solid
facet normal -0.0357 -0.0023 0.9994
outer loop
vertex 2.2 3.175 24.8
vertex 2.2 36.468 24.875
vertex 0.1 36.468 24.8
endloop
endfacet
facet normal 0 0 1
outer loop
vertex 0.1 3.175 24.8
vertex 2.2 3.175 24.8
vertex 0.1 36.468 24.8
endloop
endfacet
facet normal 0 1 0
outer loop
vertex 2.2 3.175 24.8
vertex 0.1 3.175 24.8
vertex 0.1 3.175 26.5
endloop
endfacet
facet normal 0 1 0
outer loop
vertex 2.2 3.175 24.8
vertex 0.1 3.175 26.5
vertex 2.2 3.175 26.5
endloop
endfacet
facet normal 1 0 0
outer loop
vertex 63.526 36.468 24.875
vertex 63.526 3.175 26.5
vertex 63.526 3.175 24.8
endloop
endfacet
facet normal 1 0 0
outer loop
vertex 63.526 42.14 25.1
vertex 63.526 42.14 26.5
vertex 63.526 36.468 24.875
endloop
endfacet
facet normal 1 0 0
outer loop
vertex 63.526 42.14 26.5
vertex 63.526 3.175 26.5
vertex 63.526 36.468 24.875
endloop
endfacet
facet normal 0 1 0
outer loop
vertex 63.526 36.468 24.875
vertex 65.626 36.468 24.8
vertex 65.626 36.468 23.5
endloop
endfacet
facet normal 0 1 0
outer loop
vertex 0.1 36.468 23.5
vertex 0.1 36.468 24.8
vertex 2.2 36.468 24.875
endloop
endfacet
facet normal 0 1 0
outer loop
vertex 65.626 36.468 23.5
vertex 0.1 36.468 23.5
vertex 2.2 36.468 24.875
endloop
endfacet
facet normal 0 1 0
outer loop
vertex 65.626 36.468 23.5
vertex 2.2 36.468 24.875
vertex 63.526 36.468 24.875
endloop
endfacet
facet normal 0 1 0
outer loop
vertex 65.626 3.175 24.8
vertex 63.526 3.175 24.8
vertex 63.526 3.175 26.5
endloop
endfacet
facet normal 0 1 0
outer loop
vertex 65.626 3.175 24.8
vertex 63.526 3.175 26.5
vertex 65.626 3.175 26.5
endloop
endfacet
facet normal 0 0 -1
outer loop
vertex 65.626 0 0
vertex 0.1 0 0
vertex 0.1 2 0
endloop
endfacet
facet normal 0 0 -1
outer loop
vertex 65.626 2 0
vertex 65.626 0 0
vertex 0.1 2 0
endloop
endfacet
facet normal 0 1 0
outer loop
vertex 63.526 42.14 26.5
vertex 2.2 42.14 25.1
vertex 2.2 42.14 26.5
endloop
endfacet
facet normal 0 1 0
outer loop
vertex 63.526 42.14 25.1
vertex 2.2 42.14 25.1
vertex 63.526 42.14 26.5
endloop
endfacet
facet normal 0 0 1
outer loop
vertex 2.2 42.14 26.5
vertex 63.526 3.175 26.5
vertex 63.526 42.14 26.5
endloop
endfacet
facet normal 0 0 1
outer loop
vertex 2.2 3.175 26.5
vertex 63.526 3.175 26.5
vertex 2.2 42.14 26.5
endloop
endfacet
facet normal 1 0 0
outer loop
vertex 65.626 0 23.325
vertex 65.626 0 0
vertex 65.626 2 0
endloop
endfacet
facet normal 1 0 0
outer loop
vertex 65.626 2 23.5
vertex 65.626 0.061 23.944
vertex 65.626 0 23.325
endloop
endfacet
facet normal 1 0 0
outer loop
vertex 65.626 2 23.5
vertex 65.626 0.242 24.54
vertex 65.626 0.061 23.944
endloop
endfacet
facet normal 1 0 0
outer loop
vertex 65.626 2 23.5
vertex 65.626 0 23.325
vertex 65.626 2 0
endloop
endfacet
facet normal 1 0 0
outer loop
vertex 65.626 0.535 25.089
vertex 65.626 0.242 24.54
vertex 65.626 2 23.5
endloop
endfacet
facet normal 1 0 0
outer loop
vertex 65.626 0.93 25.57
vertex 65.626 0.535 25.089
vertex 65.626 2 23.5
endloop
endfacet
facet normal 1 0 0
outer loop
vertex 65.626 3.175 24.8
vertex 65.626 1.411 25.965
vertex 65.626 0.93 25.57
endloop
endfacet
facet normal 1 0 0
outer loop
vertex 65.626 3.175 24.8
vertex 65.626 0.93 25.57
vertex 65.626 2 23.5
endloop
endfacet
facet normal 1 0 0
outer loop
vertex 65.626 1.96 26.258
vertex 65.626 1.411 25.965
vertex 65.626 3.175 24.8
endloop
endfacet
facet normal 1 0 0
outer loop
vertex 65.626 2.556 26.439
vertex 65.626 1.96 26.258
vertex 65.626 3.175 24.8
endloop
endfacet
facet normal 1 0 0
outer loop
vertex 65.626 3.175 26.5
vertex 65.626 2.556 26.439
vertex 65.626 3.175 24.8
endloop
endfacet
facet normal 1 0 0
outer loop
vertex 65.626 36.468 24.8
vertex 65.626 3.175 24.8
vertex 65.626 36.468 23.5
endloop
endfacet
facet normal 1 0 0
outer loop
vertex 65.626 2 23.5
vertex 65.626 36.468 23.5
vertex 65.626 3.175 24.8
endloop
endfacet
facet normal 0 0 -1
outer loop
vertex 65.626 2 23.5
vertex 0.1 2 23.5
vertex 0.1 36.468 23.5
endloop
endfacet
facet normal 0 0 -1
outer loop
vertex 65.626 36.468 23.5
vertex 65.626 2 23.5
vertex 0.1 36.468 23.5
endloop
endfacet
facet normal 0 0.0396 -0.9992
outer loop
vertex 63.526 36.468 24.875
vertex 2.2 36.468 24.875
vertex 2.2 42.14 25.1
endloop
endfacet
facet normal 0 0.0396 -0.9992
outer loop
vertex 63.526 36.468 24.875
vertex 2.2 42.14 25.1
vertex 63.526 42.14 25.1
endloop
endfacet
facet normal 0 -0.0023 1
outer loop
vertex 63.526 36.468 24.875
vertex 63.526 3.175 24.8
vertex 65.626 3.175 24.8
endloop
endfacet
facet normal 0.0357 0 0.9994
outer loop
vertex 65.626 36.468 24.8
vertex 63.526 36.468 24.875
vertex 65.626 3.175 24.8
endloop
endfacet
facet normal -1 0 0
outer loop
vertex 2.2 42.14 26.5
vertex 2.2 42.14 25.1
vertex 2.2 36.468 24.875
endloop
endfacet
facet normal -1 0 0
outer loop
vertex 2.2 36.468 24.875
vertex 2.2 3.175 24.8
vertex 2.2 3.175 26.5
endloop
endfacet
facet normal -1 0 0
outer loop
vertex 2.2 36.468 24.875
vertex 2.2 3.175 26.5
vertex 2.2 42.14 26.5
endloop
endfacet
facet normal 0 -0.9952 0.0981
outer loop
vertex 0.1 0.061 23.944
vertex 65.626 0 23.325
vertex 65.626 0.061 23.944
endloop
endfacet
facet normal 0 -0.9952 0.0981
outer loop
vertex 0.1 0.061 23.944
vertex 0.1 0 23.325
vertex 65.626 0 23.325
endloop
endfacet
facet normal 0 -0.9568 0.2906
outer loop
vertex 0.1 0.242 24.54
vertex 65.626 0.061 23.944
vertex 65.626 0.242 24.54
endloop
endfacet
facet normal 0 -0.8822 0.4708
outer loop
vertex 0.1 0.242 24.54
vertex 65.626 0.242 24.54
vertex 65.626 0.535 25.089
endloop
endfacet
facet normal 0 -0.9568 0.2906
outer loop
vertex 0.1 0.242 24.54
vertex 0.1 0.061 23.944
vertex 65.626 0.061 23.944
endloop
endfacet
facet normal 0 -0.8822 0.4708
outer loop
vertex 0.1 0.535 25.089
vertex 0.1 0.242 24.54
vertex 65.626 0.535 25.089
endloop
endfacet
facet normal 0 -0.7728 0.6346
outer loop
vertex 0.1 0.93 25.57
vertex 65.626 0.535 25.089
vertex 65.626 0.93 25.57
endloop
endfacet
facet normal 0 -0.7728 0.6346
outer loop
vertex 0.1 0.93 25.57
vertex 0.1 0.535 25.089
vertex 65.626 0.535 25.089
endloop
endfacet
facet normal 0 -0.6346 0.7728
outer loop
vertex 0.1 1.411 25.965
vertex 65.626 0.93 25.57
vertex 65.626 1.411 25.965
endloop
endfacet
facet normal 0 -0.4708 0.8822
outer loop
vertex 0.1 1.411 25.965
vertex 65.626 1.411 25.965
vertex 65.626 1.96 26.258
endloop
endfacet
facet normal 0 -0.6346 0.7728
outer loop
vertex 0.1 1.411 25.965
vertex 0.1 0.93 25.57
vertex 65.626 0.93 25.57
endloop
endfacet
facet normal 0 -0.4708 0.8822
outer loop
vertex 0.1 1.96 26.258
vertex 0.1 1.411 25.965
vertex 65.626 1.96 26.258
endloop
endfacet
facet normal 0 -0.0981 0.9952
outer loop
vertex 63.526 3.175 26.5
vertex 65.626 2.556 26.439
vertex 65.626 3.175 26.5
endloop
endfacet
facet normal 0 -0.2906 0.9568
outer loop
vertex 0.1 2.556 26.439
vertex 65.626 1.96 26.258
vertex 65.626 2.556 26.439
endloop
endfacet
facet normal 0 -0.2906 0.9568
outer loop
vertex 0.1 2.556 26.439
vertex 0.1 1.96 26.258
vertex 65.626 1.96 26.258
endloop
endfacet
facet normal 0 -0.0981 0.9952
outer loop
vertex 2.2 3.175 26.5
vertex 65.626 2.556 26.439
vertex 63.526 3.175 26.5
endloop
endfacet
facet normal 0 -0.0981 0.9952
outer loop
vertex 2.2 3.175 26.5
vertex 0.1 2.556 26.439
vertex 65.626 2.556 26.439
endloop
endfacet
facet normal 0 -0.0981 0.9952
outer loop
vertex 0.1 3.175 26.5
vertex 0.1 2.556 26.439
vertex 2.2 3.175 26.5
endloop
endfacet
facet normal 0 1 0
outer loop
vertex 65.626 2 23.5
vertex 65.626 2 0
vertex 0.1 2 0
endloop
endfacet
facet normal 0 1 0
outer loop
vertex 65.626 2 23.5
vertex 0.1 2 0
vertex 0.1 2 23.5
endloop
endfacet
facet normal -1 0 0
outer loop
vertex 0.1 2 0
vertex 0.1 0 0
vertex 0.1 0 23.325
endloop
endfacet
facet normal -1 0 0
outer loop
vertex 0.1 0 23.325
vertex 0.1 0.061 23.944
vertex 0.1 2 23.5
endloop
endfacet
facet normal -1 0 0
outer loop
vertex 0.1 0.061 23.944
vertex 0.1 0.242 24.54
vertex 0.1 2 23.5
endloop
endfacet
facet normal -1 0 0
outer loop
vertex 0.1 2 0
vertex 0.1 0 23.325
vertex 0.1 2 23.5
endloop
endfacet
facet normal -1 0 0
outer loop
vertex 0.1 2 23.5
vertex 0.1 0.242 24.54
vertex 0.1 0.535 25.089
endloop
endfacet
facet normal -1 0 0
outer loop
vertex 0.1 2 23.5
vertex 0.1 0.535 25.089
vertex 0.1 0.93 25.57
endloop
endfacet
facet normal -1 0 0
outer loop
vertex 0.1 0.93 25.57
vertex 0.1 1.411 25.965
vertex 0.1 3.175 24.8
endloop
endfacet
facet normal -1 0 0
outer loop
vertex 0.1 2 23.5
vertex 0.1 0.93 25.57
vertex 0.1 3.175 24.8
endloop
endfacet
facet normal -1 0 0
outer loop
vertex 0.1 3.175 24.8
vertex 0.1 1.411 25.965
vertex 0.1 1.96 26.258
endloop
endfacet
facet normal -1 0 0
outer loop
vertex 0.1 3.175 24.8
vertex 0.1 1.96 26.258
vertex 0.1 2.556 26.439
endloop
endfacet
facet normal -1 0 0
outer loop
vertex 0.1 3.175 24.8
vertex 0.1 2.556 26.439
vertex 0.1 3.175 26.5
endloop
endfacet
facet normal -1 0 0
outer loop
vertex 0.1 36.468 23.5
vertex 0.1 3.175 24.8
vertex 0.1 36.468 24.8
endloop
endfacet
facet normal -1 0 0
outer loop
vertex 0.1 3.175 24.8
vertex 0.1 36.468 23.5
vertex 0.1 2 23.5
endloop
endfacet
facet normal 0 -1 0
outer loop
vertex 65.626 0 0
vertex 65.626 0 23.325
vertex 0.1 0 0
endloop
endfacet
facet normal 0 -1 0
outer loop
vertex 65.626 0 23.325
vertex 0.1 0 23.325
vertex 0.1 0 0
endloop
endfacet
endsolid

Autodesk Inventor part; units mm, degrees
ref_plane "YZ Plane" through (0, 0, 0) normal (1, 0, 0) x (0, 1, 0)
ref_plane "XZ Plane" through (0, 0, 0) normal (0, 1, 0) x (-1, 0, 0)
ref_plane "XY Plane" through (0, 0, 0) normal (0, 0, 1) x (1, 0, 0)
sketch "Sketch1" plane through (0, 0, 0) normal (1, 0, 0) x (0, 1, 0)
  arc A0 (3.175, 26.5) -> (0, 23.325) centre (3.175, 23.325) ccw
  line L0 (36.4678, 26.5) -> (3.175, 26.5)
  line L1 (36.4678, 26.5) -> (36.4678, 23.5)
  line L2 (2, 23.5) -> (36.4678, 23.5)
  line L3 (2, 0) -> (2, 23.5)
  line L4 (0, 0) -> (2, 0)
  line L5 (0, 23.325) -> (0, 0)
  point P0 (0, 0)
extrude "Extrusion1" add sketch "Sketch1" along normal blind 65.626
sketch "Sketch2" plane through (0, 3.175, 26.5) normal (0, 0, 1) x (1, 0, 0)
  line L0 (0, 33.2928) -> (65.626, 33.2928) projected
  line L1 (7.465, 33.2928) -> (58.161, 33.2928)
  line L2 (58.161, 33.2928) -> (58.161, 39.4648)
  line L3 (58.161, 39.4648) -> (7.465, 39.4648)
  line L4 (7.465, 39.4648) -> (7.465, 33.2928)
  point P0 (0, -3.175)
  point P1 (32.813, 39.4648)
  point P2 (32.813, 33.2928)
  dimension "d2" = 50.696
  dimension "d3" = 6.172
extrude "Extrusion2" add sketch "Sketch2" against normal blind 1.7
sketch "Sketch3" plane through (0, 36.4678, 26.5) normal (0, 1, 0) x (1, 0, 0)
  line L0 (58.161, 0) -> (65.626, 0) projected
  line L1 (65.626, 0) -> (63.626, 0)
  line L2 (63.626, 0) -> (63.626, 1.7)
  line L3 (63.626, 1.7) -> (65.626, 1.7)
  line L4 (65.626, 1.7) -> (65.626, 0)
  line L5 (0, 0) -> (7.465, 0) projected
  line L6 (0, 0) -> (2, 0)
  line L7 (2, 0) -> (2, 1.7)
  line L8 (2, 1.7) -> (0, 1.7)
  line L9 (0, 1.7) -> (0, 0)
  point P0 (0, 26.5)
  point P1 (63.626, 0)
  dimension "d6" = 2
  dimension "d7" = 1.7
  dimension "d8" = 2
  dimension "d9" = 1.7
extrude "Extrusion3" cut sketch "Sketch3" against normal up to surface (33.2928 mm away)
sketch "Sketch4" plane through (0, 36.4678, 23.5) normal (0, 1, 0) x (1, 0, 0)
  line L0 (2, -1.3) -> (2, -3) projected
  line L1 (63.626, -3) -> (2, -3)
  line L2 (2, -3) -> (2, -1.3)
  line L3 (2, -1.3) -> (63.626, -1.3)
  line L4 (63.626, -1.3) -> (63.626, -3)
  point P0 (0, 23.5)
extrude "Extrusion4" add sketch "Sketch4" along normal up to surface (6.172 mm away)
sketch "Sketch5" plane through (0, 3.175, 24.8) normal (0, 0, -1) x (-1, 0, 0)
  point P0 (0, -3.175)
move faces "Move1" translate (0, 0, 0.3) faces at (43.084, 40.5825, 24.8)
move faces "Move2" translate (0.2, 0, 0) faces at (2, 27.4275, 25.9333)
move faces "Move3" translate (-0.1, 0, 0) faces at (63.626, 27.4275, 26.0333)
move faces "Move4" translate (0, -0.5, 0) faces at (22.642, 42.6398, 26.0333)
move faces "Move5" translate (0.1, 0, 0) faces at (0, 1.3333, 15.6083)
properties part number "Lid Cover"
